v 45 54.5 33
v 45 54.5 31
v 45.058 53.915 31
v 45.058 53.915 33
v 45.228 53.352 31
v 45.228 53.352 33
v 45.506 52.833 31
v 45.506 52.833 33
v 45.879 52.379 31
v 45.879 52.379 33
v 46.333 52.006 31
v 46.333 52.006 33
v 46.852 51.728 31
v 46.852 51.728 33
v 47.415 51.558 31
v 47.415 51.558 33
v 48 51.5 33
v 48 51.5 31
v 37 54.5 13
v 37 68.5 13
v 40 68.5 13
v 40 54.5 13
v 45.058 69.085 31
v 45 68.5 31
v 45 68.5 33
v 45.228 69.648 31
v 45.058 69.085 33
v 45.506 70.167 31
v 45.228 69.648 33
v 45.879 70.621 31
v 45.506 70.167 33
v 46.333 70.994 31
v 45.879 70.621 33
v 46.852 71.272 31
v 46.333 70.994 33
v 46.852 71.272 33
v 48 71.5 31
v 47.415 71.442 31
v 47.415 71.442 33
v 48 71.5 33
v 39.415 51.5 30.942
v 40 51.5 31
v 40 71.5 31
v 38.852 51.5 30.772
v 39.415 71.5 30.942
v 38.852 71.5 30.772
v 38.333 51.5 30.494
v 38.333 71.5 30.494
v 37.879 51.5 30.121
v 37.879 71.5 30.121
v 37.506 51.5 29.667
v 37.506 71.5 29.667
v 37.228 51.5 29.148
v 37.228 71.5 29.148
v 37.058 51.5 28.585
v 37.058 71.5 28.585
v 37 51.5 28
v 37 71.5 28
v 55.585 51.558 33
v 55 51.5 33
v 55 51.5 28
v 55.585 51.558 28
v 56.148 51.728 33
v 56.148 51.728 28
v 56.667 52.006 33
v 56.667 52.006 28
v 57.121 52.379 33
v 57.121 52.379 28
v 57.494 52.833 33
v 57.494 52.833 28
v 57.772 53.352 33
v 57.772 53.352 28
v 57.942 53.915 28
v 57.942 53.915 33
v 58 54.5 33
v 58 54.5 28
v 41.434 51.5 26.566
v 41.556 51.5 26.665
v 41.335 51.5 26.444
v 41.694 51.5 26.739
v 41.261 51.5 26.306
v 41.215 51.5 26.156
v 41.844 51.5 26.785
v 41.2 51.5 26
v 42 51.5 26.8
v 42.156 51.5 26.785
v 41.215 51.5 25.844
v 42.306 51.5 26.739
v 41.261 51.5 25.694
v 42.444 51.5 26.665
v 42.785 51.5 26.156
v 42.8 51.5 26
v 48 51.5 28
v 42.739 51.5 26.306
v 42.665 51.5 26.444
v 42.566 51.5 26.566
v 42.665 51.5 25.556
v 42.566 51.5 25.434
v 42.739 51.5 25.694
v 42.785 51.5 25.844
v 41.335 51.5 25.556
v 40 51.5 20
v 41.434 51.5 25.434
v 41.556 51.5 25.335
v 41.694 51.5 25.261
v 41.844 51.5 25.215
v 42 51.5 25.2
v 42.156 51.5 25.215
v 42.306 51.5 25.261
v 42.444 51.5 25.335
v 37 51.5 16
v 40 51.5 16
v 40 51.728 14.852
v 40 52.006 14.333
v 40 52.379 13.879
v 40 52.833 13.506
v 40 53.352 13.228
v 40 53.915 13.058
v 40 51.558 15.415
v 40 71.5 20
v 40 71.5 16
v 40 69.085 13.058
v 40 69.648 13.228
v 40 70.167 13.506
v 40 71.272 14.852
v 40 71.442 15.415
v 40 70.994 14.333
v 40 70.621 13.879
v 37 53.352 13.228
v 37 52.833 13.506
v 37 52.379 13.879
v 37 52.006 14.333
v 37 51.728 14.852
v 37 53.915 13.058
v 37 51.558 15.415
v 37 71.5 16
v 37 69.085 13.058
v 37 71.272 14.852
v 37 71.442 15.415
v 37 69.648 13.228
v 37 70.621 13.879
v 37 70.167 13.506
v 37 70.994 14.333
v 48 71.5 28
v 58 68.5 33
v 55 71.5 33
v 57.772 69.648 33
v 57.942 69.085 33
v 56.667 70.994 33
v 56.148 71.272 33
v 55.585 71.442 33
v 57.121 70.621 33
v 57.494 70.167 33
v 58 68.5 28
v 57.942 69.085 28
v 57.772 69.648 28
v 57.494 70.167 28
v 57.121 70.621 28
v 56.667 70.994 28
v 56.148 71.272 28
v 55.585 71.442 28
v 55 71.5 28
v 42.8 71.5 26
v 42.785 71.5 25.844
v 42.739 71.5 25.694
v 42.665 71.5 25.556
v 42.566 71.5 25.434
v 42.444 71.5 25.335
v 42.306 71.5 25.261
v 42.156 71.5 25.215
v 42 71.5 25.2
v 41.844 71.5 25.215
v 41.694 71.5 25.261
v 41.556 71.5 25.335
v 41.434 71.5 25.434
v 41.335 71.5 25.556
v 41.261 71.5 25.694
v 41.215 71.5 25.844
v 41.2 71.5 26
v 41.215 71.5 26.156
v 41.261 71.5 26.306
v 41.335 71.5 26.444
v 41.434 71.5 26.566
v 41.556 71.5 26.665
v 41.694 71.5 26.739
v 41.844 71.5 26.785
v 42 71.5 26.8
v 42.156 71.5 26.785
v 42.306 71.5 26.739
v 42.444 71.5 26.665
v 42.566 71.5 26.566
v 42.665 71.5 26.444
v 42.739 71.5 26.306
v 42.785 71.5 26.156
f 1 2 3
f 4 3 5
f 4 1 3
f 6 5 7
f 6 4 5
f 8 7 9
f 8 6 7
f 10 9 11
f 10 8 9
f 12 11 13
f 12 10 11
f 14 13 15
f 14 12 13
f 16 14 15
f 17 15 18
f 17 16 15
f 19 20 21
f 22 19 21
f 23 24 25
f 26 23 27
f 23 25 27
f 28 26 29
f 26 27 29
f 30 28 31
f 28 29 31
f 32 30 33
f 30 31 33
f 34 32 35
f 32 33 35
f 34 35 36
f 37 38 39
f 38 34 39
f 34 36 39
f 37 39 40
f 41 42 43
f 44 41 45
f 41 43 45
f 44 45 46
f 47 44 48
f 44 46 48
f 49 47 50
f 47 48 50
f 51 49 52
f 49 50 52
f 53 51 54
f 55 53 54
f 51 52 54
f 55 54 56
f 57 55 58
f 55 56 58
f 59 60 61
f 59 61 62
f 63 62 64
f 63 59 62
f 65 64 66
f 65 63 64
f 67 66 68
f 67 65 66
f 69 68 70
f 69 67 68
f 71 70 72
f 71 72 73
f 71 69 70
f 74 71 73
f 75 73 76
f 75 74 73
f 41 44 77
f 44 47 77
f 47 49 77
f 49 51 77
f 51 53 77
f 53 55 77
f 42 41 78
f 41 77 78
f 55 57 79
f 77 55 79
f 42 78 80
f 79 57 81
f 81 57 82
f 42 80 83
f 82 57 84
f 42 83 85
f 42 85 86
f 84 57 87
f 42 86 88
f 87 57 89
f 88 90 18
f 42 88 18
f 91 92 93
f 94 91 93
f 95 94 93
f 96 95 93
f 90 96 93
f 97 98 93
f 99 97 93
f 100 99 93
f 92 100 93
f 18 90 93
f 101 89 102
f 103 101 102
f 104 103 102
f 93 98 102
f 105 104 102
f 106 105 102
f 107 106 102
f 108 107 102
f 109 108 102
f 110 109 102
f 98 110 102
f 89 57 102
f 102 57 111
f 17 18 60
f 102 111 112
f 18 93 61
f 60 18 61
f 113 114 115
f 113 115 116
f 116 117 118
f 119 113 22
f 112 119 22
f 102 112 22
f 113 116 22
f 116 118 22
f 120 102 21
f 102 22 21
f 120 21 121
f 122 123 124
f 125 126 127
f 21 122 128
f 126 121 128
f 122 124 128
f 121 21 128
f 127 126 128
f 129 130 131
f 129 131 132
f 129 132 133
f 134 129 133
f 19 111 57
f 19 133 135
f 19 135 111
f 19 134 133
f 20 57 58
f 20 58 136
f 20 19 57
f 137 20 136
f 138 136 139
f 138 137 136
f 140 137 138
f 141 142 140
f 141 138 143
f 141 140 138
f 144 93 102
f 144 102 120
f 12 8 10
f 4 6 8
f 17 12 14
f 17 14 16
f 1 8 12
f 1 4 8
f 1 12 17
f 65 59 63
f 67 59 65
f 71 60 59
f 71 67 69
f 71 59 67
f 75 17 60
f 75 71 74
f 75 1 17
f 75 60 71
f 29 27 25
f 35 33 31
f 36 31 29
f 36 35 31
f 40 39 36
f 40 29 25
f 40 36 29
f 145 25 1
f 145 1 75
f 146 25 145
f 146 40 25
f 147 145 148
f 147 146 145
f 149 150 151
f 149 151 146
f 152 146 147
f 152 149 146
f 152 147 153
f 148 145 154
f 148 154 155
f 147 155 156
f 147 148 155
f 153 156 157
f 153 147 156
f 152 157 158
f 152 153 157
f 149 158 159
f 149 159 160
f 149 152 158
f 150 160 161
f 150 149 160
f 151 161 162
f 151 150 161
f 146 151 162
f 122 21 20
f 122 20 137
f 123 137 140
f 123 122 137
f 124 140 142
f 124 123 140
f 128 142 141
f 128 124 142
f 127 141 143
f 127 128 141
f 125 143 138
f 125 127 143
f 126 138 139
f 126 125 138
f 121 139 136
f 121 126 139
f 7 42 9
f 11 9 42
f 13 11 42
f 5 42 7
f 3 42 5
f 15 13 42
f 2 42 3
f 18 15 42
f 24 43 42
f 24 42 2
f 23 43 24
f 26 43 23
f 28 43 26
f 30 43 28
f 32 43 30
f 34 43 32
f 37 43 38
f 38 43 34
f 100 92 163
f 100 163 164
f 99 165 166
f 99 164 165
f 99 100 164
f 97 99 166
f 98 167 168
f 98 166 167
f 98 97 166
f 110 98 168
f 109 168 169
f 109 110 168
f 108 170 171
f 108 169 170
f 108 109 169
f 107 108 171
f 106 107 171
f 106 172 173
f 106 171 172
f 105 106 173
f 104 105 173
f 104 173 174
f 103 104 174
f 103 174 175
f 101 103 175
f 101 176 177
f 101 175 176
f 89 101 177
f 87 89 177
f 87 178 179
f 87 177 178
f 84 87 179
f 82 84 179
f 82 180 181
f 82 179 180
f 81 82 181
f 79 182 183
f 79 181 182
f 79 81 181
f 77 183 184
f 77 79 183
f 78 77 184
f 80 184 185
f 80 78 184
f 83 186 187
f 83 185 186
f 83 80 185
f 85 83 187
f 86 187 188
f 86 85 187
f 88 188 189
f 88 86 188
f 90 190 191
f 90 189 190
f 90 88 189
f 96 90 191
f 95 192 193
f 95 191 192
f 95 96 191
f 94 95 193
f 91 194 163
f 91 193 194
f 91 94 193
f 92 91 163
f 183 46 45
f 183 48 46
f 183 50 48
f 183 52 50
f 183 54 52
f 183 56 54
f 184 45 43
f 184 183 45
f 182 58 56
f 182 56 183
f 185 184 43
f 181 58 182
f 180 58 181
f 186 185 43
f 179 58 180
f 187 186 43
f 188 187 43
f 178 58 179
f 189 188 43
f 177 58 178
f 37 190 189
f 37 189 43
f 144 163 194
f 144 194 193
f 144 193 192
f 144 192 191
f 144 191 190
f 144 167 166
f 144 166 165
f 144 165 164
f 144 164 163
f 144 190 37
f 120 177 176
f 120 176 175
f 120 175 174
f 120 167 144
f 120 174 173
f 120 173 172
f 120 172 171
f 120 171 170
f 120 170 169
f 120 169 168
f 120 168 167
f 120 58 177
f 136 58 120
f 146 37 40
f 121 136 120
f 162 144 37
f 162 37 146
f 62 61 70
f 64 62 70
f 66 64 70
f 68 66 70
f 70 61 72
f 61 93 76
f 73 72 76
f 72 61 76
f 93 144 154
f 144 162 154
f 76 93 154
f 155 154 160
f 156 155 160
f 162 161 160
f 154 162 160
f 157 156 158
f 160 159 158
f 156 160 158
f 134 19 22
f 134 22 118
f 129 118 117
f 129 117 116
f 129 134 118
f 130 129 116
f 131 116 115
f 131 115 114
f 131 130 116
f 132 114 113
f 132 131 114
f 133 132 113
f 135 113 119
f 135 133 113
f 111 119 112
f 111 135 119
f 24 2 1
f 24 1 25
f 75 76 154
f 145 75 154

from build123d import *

# Parameters (mm, degrees)
CYLINDER038_R     = 0.8
CYLINDER038_DEPTH = 30
BOX040_W          = 21
BOX040_H          = 20
BOX040_DEPTH      = 18
CHAMFER_SIZE      = 8
BOX041_W          = 13
BOX041_H          = 20
BOX041_DEPTH      = 5
FILLET002033_R    = 3
BOX031_W          = 21
BOX031_H          = 20
BOX031_DEPTH      = 18
FILLET002030_R    = 3
FILLET002031_R    = 3
FILLET002032_R    = 3


with BuildPart() as screwholle019:
    # Cylinder038 → Cylinder038 (new body)
    with BuildSketch(Plane(origin=(42, 45, 26), x_dir=(1, 0, 0), z_dir=(0, 1, 0))):
        Circle(CYLINDER038_R)
    extrude(amount=CYLINDER038_DEPTH)


with BuildPart() as fusion024:
    # Box040 → Box040 (new body)
    with BuildSketch(Plane(origin=(40, 51.5, 10), x_dir=(1, 0, 0), z_dir=(0, 0, 1))):
        with Locations((10.5, 10)):
            Rectangle(BOX040_W, BOX040_H)
    extrude(amount=BOX040_DEPTH)

    # Chamfer
    chamfer_edges = [fusion024.edges().sort_by_distance(p)[0] for p in [
        (40, 61.5, 28),
    ]]
    chamfer(chamfer_edges, length=CHAMFER_SIZE)

    # Fusion024: union ScrewHolle019
    add(screwholle019.part)


with BuildPart() as fillet002033:
    # Box041 → Box041 (new body)
    with BuildSketch(Plane(origin=(45, 51.5, 28), x_dir=(1, 0, 0), z_dir=(0, 0, 1))):
        with Locations((6.5, 10)):
            Rectangle(BOX041_W, BOX041_H)
    extrude(amount=BOX041_DEPTH)

    # Fillet002033
    fillet002033_edges = [fillet002033.edges().sort_by_distance(p)[0] for p in [
        (45, 51.5, 30.5),
        (45, 71.5, 30.5),
        (58, 51.5, 30.5),
        (58, 71.5, 30.5),
    ]]
    fillet(fillet002033_edges, radius=FILLET002033_R)


with BuildPart() as button:
    # Box031 → Box031 (new body)
    with BuildSketch(Plane(origin=(37, 51.5, 13), x_dir=(1, 0, 0), z_dir=(0, 0, 1))):
        with Locations((10.5, 10)):
            Rectangle(BOX031_W, BOX031_H)
    extrude(amount=BOX031_DEPTH)

    # Fillet002030
    fillet002030_edges = [button.edges().sort_by_distance(p)[0] for p in [
        (58, 51.5, 22),
        (58, 71.5, 22),
    ]]
    fillet(fillet002030_edges, radius=FILLET002030_R)

    # Fillet002031
    fillet002031_edges = [button.edges().sort_by_distance(p)[0] for p in [
        (46, 71.5, 13),
        (46, 51.5, 13),
    ]]
    fillet(fillet002031_edges, radius=FILLET002031_R)

    # Fillet002032
    fillet002032_edges = [button.edges().sort_by_distance(p)[0] for p in [
        (37, 61.5, 31),
    ]]
    fillet(fillet002032_edges, radius=FILLET002032_R)

    # Fusion025: union Fillet002033
    add(fillet002033.part)

    # Cut006: cut Fusion024
    add(fusion024.part, mode=Mode.SUBTRACT)


solid = button.part
